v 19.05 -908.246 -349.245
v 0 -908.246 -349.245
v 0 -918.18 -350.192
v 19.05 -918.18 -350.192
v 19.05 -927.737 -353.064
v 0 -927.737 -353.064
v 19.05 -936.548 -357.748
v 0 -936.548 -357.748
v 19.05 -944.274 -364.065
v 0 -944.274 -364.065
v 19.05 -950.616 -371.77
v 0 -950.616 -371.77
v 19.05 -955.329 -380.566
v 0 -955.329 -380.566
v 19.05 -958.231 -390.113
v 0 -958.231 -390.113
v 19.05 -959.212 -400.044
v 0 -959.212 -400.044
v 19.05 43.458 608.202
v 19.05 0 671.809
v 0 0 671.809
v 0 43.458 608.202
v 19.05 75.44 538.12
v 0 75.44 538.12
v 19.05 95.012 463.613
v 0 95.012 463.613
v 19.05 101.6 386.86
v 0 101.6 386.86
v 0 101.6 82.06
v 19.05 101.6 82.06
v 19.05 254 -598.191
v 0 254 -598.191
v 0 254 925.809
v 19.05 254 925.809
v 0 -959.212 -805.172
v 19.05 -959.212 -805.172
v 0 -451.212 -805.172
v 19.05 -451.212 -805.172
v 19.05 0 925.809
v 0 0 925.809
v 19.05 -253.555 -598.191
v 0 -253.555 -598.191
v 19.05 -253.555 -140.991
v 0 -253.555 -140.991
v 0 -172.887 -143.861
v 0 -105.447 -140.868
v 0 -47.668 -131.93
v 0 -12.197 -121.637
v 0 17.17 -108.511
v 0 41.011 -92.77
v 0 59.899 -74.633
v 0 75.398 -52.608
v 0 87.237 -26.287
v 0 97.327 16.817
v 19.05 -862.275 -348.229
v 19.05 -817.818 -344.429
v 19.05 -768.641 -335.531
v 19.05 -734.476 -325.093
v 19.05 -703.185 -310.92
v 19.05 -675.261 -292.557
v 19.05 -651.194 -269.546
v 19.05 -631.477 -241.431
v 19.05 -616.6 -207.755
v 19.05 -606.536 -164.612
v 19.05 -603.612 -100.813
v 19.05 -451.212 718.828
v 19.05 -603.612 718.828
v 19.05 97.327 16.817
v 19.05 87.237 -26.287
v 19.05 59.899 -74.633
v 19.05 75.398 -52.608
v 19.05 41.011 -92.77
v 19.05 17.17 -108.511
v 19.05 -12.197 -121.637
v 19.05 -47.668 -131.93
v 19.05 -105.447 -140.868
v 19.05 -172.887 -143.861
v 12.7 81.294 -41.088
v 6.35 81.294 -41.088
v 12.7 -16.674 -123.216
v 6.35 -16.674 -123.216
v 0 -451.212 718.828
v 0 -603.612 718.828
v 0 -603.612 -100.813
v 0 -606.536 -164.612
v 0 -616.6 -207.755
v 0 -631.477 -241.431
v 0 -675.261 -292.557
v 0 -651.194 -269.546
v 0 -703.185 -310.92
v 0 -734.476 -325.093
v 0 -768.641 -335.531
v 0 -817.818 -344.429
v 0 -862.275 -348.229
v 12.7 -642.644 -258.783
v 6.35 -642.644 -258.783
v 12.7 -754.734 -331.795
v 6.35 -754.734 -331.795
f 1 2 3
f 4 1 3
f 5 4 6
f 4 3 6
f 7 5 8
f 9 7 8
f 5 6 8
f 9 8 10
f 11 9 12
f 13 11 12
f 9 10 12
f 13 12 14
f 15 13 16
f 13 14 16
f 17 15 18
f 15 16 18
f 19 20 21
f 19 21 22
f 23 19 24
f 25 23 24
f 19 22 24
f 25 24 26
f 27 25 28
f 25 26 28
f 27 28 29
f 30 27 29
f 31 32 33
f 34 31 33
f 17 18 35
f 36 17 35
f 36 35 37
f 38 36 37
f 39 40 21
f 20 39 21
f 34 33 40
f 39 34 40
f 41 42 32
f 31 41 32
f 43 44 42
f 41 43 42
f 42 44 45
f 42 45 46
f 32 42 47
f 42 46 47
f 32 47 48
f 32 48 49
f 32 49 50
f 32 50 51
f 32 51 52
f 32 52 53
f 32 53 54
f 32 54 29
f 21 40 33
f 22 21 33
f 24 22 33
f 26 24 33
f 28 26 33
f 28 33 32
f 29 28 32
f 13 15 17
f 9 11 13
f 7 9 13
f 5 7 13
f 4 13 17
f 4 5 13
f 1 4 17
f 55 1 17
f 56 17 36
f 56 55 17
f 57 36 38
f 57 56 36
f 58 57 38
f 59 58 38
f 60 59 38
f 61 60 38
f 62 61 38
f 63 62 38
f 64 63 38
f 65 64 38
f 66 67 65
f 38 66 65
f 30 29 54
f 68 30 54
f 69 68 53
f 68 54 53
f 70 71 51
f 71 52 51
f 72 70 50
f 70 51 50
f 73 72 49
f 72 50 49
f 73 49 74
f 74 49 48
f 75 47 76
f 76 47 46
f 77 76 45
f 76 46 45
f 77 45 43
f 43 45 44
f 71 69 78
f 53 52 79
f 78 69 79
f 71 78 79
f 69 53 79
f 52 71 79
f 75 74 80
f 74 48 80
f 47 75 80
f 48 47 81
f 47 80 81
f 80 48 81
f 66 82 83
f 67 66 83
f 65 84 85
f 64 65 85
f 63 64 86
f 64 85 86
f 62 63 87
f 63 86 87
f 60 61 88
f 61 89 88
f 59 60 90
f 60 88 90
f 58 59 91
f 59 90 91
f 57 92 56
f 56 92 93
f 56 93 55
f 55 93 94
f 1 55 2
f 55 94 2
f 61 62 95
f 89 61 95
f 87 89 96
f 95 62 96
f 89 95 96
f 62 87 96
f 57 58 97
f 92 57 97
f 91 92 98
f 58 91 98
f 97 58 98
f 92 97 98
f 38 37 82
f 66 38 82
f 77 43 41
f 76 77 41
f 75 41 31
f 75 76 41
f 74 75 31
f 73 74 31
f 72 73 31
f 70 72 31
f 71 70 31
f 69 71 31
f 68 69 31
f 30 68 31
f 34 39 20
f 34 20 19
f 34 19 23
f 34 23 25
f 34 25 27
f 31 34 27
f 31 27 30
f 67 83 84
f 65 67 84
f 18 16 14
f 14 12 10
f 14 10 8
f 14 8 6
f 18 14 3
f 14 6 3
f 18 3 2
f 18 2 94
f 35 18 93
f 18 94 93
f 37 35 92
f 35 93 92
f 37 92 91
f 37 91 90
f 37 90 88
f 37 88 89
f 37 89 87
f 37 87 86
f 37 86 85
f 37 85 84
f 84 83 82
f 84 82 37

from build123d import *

# Parameters (mm, degrees)
F1_DEPTH = 19.05
F3_DEPTH = 19.05


with BuildPart() as f1:
    # F0 (on Right) → F1 (new body)
    with BuildSketch(Plane.YZ):
        with BuildLine():
            Line((254, -598.191057), (254, 925.808943))
            Line((254, 925.808943), (0, 925.808943))
            Line((0, 925.808943), (0, 671.808943))
            ThreePointArc((0, 671.808943), (75.440284, 538.120113), (101.6, 386.860043))
            Line((101.6, 386.860043), (101.6, 82.060043))
            add(Edge.make_bspline(
                [(101.6, 82.060043), (99.708706, -53.820543), (73.2003, -163.170949), (-253.555367, -140.991057)],
                knots=[0, 0, 0, 0, 419.388993, 419.388993, 419.388993, 419.388993], degree=3))
            Line((-253.555367, -140.991057), (-253.555367, -598.191057))
            Line((-253.555367, -598.191057), (254, -598.191057))
        make_face()
    extrude(amount=F1_DEPTH)


with BuildPart() as f3:
    # F2 (on Right) → F3 (new body)
    with BuildSketch(Plane.YZ):
        with BuildLine():
            Line((-451.211648, -805.17151), (-451.211648, 718.82849))
            Line((-451.211648, 718.82849), (-603.611648, 718.82849))
            Line((-603.611648, 718.82849), (-603.611648, -100.812897))
            add(Edge.make_bspline(
                [(-603.611648, -100.812897), (-595.571504, -311.059936), (-744.566522, -349.778727), (-908.245895, -349.244662)],
                knots=[0, 0, 0, 0, 392.562488, 392.562488, 392.562488, 392.562488], degree=3))
            ThreePointArc((-908.245895, -349.244662), (-944.274022, -364.064813), (-959.211648, -400.044392))
            Line((-959.211648, -400.044392), (-959.211648, -805.17151))
            Line((-959.211648, -805.17151), (-451.211648, -805.17151))
        make_face()
    extrude(amount=F3_DEPTH)


solid = Compound([f1.part, f3.part])
